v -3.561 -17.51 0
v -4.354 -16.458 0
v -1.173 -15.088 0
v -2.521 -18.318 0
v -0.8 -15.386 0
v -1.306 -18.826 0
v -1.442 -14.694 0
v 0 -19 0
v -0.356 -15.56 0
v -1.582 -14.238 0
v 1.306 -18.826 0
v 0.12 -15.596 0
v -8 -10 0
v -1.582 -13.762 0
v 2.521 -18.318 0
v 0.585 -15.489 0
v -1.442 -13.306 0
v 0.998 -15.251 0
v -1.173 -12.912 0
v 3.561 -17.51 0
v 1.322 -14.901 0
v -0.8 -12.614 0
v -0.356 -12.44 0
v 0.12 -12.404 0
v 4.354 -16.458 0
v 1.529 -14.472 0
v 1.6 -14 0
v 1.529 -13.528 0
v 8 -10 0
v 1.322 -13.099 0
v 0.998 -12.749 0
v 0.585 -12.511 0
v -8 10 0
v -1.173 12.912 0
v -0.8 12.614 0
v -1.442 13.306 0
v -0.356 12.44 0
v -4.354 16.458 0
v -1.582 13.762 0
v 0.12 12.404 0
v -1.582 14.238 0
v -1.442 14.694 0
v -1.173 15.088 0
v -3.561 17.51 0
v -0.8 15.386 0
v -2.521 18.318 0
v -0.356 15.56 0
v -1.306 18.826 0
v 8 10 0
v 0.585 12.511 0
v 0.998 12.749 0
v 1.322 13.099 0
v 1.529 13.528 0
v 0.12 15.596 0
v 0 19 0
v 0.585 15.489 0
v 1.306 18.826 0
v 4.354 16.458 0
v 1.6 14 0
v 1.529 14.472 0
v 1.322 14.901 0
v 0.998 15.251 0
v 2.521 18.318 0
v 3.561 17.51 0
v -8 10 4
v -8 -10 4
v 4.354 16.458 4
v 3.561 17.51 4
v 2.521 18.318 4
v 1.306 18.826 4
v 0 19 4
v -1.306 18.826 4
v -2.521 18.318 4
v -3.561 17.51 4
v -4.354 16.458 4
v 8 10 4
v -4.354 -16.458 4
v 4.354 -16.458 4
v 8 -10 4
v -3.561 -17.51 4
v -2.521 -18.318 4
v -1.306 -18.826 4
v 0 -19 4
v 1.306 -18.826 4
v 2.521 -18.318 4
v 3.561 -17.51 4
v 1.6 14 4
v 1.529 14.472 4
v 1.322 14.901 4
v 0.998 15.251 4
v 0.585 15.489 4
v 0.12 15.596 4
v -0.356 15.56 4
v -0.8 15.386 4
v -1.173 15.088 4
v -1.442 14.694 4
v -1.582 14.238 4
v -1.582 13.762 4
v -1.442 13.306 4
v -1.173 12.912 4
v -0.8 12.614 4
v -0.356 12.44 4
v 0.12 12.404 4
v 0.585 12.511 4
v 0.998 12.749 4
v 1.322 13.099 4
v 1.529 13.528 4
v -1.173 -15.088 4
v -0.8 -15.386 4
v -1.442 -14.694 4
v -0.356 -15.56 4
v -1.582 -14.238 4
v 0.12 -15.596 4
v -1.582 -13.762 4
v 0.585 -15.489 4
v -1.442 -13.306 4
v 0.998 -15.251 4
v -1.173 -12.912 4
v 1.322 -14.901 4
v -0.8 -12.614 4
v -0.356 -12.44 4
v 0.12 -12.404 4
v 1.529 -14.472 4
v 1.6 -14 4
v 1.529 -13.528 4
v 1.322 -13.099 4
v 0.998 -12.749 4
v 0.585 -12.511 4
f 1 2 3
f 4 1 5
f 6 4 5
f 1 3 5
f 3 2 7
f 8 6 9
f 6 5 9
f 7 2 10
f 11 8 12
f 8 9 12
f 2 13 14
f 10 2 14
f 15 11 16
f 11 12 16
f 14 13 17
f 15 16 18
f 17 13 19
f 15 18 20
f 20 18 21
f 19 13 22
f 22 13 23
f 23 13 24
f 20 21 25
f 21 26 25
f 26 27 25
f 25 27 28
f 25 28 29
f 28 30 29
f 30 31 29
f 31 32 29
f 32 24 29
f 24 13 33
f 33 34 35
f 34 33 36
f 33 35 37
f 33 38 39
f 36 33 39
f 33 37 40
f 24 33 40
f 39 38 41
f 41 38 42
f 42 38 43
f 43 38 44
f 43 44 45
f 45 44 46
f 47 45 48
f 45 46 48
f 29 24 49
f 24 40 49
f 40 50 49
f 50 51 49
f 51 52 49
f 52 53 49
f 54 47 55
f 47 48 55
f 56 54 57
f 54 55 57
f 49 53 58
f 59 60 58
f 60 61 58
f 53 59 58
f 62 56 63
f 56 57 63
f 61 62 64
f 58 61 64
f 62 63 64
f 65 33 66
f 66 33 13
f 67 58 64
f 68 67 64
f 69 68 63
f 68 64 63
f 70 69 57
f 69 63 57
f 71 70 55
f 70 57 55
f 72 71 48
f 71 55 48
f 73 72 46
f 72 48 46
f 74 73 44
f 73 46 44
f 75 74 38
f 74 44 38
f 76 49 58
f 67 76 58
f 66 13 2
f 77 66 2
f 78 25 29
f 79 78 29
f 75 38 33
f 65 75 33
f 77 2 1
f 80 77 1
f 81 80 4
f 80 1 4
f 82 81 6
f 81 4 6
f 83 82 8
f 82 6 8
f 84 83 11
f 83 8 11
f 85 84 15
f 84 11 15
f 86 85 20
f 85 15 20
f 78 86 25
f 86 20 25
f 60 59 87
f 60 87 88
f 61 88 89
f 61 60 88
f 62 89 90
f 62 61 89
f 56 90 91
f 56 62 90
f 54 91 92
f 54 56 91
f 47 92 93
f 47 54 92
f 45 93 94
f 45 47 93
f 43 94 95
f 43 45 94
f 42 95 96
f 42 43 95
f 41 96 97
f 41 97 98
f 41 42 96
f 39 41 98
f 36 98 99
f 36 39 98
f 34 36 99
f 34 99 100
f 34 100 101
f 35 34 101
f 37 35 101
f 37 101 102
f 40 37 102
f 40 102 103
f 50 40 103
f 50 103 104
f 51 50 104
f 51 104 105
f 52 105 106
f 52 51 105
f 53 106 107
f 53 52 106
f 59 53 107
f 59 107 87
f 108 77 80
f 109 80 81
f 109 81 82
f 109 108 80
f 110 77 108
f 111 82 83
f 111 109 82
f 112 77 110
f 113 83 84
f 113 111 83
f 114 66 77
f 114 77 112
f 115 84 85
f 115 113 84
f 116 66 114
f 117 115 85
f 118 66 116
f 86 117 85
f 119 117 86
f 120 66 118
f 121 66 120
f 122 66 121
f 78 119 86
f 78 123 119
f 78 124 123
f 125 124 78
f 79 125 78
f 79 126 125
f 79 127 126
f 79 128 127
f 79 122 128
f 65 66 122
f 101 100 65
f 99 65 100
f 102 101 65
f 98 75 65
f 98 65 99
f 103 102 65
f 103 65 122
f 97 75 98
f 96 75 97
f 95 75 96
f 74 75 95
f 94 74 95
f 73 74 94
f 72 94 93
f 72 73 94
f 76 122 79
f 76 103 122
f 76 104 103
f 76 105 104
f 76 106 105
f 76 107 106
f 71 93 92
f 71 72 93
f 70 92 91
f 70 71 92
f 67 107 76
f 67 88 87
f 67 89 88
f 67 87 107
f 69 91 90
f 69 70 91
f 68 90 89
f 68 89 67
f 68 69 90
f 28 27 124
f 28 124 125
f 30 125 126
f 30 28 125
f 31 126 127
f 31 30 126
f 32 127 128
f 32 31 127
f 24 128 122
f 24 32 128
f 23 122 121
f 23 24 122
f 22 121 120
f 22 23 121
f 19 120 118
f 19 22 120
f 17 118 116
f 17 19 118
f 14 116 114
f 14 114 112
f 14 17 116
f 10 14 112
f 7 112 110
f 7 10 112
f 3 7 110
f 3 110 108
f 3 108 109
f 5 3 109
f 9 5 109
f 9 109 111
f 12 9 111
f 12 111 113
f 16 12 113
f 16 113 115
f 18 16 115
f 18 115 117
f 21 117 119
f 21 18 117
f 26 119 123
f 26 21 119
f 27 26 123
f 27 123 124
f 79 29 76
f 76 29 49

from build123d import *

# Parameters (mm, degrees)
SKETCH_R  = 1.6
PAD_DEPTH = 4


with BuildPart() as part:
    # Sketch → Pad (new body)
    with BuildSketch(Plane.XY):
        with BuildLine():
            ThreePointArc((4.35405, 16.458099), (0, 19), (-4.35405, 16.458099))
            Line((-4.35405, 16.458099), (-8, 10))
            Line((-8, 10), (-8, -10))
            Line((-8, -10), (-4.35405, -16.458099))
            ThreePointArc((-4.35405, -16.458099), (0, -19), (4.35405, -16.458099))
            Line((4.35405, -16.458099), (8, -10))
            Line((8, -10), (8, 10))
            Line((8, 10), (4.35405, 16.458099))
        make_face()
        with Locations((0, 14)):
            Circle(SKETCH_R, mode=Mode.SUBTRACT)
        with Locations((0, -14)):
            Circle(SKETCH_R, mode=Mode.SUBTRACT)
    extrude(amount=PAD_DEPTH)


solid = part.part
